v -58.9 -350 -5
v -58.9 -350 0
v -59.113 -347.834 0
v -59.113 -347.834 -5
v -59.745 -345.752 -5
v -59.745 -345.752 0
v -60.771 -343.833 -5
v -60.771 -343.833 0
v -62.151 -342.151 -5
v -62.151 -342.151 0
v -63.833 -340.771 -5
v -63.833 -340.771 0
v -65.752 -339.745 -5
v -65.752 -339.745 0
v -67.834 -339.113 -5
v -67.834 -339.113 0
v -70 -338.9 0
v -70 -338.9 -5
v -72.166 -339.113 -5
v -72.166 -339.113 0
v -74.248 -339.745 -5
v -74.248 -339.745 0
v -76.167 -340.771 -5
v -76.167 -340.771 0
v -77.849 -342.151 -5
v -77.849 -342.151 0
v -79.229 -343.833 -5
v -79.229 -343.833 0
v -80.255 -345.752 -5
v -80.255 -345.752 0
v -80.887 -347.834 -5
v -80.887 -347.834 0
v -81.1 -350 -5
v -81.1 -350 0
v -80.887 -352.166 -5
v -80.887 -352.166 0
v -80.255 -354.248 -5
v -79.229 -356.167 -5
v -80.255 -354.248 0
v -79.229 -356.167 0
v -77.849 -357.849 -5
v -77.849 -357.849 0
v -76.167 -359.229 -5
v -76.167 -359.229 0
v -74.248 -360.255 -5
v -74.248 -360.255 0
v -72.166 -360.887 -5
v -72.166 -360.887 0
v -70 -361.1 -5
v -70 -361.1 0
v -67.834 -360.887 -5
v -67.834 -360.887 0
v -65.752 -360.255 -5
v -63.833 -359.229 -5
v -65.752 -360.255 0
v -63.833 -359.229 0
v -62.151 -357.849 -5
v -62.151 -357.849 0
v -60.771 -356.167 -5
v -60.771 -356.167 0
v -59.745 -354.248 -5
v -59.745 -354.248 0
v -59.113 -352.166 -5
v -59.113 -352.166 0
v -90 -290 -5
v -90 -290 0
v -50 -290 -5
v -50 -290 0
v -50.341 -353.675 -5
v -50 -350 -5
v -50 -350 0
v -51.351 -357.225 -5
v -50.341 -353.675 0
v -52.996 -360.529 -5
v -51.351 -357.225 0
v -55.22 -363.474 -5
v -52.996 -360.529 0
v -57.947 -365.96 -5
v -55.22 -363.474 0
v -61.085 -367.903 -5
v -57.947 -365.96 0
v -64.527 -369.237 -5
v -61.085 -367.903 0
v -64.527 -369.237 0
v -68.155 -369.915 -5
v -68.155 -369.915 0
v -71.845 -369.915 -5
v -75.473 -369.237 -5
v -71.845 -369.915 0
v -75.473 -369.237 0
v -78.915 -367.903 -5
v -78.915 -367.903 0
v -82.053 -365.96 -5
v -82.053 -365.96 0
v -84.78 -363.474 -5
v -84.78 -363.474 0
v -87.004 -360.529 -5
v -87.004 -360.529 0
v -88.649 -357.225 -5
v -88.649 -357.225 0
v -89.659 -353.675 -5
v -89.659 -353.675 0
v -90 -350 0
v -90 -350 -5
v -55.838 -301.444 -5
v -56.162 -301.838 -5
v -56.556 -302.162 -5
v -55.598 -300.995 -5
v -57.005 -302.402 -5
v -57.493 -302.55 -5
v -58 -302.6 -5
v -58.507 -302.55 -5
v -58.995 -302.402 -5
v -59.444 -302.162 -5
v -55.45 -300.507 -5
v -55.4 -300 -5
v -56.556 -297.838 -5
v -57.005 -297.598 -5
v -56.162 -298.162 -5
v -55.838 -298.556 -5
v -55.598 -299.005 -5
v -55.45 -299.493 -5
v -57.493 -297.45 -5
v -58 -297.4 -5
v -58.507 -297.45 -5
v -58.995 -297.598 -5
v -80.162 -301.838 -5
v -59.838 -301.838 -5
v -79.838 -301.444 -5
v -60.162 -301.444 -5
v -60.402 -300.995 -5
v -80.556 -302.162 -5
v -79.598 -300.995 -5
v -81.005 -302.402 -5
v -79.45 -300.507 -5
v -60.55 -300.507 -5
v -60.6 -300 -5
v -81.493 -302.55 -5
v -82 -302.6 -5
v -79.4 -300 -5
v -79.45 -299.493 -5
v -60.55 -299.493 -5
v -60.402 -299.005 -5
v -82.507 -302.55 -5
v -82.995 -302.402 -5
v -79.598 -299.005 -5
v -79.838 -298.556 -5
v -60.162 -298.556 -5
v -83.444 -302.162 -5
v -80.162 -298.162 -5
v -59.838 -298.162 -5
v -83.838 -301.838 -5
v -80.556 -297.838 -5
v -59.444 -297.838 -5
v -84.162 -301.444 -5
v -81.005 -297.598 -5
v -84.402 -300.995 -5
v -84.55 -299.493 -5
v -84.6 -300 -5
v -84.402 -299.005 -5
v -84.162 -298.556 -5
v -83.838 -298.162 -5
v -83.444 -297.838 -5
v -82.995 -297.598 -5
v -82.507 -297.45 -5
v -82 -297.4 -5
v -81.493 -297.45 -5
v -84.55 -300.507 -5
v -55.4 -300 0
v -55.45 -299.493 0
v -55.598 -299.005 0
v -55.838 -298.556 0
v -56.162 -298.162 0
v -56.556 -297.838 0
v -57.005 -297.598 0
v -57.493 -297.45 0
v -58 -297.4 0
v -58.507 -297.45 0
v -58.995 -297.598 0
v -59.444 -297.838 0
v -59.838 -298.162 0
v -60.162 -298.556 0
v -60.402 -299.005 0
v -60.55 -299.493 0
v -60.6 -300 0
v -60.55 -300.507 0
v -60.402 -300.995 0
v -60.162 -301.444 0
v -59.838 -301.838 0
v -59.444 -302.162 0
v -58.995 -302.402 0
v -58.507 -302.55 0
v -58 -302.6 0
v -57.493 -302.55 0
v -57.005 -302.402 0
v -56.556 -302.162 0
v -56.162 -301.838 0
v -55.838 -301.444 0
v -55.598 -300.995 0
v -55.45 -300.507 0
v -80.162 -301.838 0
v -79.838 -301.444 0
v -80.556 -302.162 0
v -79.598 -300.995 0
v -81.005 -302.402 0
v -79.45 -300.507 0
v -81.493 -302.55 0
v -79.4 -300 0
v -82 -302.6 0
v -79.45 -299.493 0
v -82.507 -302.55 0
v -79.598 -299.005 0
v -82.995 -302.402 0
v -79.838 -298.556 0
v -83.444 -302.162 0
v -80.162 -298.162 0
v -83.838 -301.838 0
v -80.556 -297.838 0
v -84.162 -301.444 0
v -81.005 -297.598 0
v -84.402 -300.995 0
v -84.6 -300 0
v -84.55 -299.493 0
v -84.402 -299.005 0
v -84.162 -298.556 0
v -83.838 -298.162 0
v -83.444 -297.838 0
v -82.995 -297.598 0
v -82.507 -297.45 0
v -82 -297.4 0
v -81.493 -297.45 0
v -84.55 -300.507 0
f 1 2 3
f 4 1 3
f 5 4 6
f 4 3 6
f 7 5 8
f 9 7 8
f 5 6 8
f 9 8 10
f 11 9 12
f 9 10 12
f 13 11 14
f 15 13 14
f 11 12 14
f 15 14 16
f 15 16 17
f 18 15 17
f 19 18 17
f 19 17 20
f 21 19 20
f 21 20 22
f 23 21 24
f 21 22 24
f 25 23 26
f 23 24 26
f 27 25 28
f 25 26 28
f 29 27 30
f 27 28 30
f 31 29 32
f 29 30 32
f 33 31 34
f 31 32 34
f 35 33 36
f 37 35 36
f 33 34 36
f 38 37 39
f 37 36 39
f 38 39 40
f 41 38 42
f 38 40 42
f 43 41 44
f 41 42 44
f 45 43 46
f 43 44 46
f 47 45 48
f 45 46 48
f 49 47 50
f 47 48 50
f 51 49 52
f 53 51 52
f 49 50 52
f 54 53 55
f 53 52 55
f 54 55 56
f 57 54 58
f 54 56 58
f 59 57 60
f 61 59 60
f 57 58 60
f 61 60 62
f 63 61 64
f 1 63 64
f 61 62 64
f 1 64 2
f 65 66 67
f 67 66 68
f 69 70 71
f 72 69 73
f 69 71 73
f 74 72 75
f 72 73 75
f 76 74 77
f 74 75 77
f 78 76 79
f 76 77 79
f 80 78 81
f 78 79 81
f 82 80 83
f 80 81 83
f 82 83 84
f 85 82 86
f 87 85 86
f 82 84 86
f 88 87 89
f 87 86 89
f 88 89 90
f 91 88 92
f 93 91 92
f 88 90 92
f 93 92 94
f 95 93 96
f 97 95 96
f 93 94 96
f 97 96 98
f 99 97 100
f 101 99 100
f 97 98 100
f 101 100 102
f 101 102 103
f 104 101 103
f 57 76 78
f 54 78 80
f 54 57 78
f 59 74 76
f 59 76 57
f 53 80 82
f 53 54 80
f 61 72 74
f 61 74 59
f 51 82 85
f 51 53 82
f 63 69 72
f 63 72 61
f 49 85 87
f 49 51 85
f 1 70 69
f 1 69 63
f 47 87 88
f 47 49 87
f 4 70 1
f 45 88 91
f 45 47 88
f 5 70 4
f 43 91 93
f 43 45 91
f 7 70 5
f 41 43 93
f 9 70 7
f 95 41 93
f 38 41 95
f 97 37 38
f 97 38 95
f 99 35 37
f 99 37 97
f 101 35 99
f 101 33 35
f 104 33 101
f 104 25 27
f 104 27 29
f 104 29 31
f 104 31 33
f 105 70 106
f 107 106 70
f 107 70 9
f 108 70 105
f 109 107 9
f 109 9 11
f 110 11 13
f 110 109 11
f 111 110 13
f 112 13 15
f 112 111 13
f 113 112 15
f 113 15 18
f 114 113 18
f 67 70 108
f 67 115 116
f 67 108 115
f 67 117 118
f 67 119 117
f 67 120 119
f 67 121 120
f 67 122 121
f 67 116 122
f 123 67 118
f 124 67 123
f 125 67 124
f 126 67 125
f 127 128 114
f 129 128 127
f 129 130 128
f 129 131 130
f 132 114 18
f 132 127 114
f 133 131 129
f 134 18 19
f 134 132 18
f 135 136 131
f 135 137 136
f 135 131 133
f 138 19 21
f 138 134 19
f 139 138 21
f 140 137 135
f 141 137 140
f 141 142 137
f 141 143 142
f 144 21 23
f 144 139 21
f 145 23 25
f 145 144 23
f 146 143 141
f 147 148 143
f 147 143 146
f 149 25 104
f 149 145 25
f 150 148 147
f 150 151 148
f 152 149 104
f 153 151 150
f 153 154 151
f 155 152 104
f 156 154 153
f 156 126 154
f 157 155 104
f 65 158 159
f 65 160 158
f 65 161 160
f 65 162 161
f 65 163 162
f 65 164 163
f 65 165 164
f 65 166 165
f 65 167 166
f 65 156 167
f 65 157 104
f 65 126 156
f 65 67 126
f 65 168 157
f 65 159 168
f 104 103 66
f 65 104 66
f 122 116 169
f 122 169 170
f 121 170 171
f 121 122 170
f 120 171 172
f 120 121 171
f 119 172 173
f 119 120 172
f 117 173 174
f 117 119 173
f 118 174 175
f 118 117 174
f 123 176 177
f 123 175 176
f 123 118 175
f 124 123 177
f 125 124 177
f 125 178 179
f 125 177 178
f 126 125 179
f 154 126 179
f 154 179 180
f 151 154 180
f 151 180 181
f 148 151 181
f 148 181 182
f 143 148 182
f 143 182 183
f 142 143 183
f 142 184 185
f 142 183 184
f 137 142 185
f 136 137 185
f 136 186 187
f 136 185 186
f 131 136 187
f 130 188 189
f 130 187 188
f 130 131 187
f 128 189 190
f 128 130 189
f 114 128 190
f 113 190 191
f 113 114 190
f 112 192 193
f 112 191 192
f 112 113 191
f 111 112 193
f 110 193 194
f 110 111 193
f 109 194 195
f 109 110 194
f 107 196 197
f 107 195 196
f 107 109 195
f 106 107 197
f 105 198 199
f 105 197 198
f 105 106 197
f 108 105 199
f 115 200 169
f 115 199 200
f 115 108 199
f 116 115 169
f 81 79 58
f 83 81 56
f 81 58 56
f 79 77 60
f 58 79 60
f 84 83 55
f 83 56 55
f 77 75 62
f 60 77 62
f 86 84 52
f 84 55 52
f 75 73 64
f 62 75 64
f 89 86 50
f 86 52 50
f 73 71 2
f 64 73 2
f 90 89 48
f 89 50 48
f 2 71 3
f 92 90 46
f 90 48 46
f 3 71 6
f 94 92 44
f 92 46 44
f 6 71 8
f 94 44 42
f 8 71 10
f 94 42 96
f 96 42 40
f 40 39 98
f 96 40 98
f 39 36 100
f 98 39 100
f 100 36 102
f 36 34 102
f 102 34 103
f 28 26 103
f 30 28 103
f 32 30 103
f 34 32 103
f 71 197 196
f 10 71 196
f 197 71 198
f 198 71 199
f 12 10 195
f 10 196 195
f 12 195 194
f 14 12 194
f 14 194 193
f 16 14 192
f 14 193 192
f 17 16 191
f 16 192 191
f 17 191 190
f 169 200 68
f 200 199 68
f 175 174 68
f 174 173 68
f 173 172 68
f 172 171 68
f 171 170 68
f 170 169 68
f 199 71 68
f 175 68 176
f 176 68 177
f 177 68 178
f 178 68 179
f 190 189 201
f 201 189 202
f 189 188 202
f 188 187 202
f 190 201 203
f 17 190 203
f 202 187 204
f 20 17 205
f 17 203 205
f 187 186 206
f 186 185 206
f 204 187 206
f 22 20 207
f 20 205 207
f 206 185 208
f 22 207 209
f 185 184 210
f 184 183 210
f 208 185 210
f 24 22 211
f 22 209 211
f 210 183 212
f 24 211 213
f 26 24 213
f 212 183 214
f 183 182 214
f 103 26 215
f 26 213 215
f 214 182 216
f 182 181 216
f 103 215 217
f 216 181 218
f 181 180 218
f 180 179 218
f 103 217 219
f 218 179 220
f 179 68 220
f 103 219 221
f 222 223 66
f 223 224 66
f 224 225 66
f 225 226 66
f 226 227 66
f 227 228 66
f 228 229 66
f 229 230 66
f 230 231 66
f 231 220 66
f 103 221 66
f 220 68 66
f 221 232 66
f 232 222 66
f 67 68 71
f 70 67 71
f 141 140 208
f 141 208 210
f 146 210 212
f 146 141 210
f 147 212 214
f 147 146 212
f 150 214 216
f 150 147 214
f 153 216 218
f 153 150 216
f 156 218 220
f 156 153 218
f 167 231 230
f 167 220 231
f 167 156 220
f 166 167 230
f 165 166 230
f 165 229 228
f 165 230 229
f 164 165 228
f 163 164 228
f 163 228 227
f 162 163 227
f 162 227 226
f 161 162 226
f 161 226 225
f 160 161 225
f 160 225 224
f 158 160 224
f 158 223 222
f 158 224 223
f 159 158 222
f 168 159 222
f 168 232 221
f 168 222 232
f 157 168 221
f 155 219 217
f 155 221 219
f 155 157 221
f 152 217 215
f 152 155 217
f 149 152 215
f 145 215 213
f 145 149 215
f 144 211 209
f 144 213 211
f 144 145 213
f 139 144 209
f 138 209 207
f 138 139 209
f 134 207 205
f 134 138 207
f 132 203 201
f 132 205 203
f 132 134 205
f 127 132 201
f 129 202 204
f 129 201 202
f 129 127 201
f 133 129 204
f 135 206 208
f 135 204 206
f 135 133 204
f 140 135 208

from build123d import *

# Parameters (mm, degrees)
SKETCH_1_R                = 20
SKETCH_1_R_2              = 11
EXTRUDE_1_DEPTH           = 60
EXTRUDE_2_DEPTH           = 30
SKETCH_4_R                = 11
EXTRUDE_3_DEPTH           = 5
SKETCH_8_R                = 11
CUT_EXTRUDE_1_DEPTH       = 100
FILLET_4_R                = 20
EXTRUDE_START             = -30
SKETCH_18_R               = 35
EXTRUDE_4_DEPTH           = 5
EXTRUDE_START_2           = -25
SKETCH_19_R               = 35
EXTRUDE_5_DEPTH           = 5
FILLET_5_R                = 10
CUT_EXTRUDE_9_DEPTH       = 388.169213652
CUT_EXTRUDE_9_DEPTH_BACK  = 388.169213652
SKETCH_21_R               = 2.6
CUT_EXTRUDE_10_DEPTH      = 407.881000043
CUT_EXTRUDE_10_DEPTH_BACK = 407.881000043
SKETCH_22_W               = 65
SKETCH_22_H               = 431.087956996
MOVE_FACE_1_BY            = 0.1


with BuildPart() as part:
    # 草图1 → 凸台-拉伸1 (new body)
    with BuildSketch(Plane.XY):
        Circle(SKETCH_1_R)
        Circle(SKETCH_1_R_2, mode=Mode.SUBTRACT)
    extrude(amount=EXTRUDE_1_DEPTH)

    # 草图2 → 凸台-拉伸2 (add, symmetric)
    with BuildSketch(Plane.XY.offset(30)):
        with BuildLine():
            Line((-14.142135624, 14.142135624), (-90, -61.715728753))
            Line((-90, -61.715728753), (-90, -320))
            Line((-90, -320), (-50, -320))
            Line((-50, -320), (-50, -78.284271247))
            Line((-50, -78.284271247), (14.142135624, -14.142135624))
            ThreePointArc((14.142135624, -14.142135624), (-14.142135624, -14.142135624), (-14.142135624, 14.142135624))
        make_face()
    extrude(amount=EXTRUDE_2_DEPTH, both=True)

    # 草图4 → 凸台-拉伸3 (add)
    with BuildSketch(Plane.XY.offset(60)):
        with BuildLine():
            Line((-90, -290), (-50, -290))
            Line((-50, -290), (-50, -350))
            ThreePointArc((-50, -350), (-70, -370), (-90, -350))
            Line((-90, -350), (-90, -290))
        make_face()
        with Locations((-70, -350)):
            Circle(SKETCH_4_R, mode=Mode.SUBTRACT)
    extrude_3 = extrude(amount=EXTRUDE_3_DEPTH)

    # 镜向1: 凸台-拉伸3 across plane
    add(extrude_3.mirror(Plane.XY.offset(30)))

    # 草图8 → 切除-拉伸1 (cut)
    with BuildSketch(Plane.XY.offset(60)):
        with Locations((-35.355339059, -35.355339059)):
            Circle(SKETCH_8_R)
    extrude(amount=-CUT_EXTRUDE_1_DEPTH, mode=Mode.SUBTRACT)

    # 圆角4
    fillet_4_edges = [part.edges().sort_by_distance(p)[0] for p in [
        (-50, -78.284271247, 30),
        (-90, -61.715728753, 30),
    ]]
    fillet(fillet_4_edges, radius=FILLET_4_R)

    # 草图18 → 凸台-拉伸4 (add)
    with BuildSketch(Plane.XY.offset(60).offset(EXTRUDE_START)):
        with BuildLine():
            ThreePointArc((15.487252676, -12.654841151), (14.833346688, -13.415357842), (14.142135624, -14.142135624))
            Line((14.142135624, -14.142135624), (-44.142135624, -72.426406871))
            ThreePointArc((-44.142135624, -72.426406871), (-48.47759065, -78.914873848), (-50, -86.568542495))
            Line((-50, -86.568542495), (-50, -128.513280962))
            Line((-50, -128.513280962), (20.291868618, -128.513280962))
            ThreePointArc((20.291868618, -128.513280962), (62.790327113, -100.116718851), (52.818780552, -49.986369028))
            Line((52.818780552, -49.986369028), (15.487252676, -12.654841151))
        make_face()
        with Locations((20.291868618, -82.513280962)):
            Circle(SKETCH_18_R, mode=Mode.SUBTRACT)
    extrude(amount=EXTRUDE_4_DEPTH)

    # 草图19 → 凸台-拉伸5 (add)
    with BuildSketch(Plane(origin=(0, 0, 0), x_dir=(-1, 0, 0), z_dir=(0, 0, -1)).offset(EXTRUDE_START_2)):
        with BuildLine():
            Line((50, -134.571348531), (50, -226.571348531))
            Line((50, -226.571348531), (-0.680255104, -226.571348531))
            ThreePointArc((-0.680255104, -226.571348531), (-46.680255104, -180.571348531), (-0.680255104, -134.571348531))
            Line((-0.680255104, -134.571348531), (50, -134.571348531))
        make_face()
        with Locations((-0.680255104, -180.571348531)):
            Circle(SKETCH_19_R, mode=Mode.SUBTRACT)
    extrude(amount=-EXTRUDE_5_DEPTH)

    # 圆角5
    # the kernel refuses this fillet: 10 mm, written as the material it adds along each edge
    with BuildSketch(Plane(origin=(-50, -226.571348531, 25), x_dir=(0, -1, 0), z_dir=(0, 0, 1)), Plane(origin=(-50, -128.513280962, 30), x_dir=(0, -1, 0), z_dir=(0, 0, 1))) as fillet_5_piece_1:
        with BuildLine():
            CenterArc((FILLET_5_R, FILLET_5_R), FILLET_5_R, 180, 90)
            Line((0, FILLET_5_R), (0, 0))
            Line((0, 0), (FILLET_5_R, 0))
        make_face()
    extrude(amount=5)

    # 草图21 → 切除-拉伸9 (cut, two sides: drawn at the far end of the back side and taken through both)
    with BuildSketch(Plane.XY.offset(65).offset(-CUT_EXTRUDE_9_DEPTH_BACK)):
        with Locations((-70, -75)):
            Circle(SKETCH_21_R)
        with Locations((-70, -250)):
            Circle(SKETCH_21_R)
        with Locations((-58, -300)):
            Circle(SKETCH_21_R)
        with Locations((-82, -300)):
            Circle(SKETCH_21_R)
    extrude(amount=CUT_EXTRUDE_9_DEPTH + CUT_EXTRUDE_9_DEPTH_BACK, mode=Mode.SUBTRACT)

    # 草图22 → 切除-拉伸10 (cut, two sides: drawn at the far end of the back side and taken through both)
    with BuildSketch(Plane.ZY.offset(90).offset(-CUT_EXTRUDE_10_DEPTH_BACK)):
        with Locations((32.5, -154.456021502)):
            Rectangle(SKETCH_22_W, SKETCH_22_H)
    extrude(amount=CUT_EXTRUDE_10_DEPTH + CUT_EXTRUDE_10_DEPTH_BACK, mode=Mode.SUBTRACT)

    # Move Face 1: a curved face moved inward by 0.1
    add(Solid.thicken(part.faces().sort_by_distance((-81, -350, -2.5))[0], -MOVE_FACE_1_BY), mode=Mode.SUBTRACT)


solid = part.part
